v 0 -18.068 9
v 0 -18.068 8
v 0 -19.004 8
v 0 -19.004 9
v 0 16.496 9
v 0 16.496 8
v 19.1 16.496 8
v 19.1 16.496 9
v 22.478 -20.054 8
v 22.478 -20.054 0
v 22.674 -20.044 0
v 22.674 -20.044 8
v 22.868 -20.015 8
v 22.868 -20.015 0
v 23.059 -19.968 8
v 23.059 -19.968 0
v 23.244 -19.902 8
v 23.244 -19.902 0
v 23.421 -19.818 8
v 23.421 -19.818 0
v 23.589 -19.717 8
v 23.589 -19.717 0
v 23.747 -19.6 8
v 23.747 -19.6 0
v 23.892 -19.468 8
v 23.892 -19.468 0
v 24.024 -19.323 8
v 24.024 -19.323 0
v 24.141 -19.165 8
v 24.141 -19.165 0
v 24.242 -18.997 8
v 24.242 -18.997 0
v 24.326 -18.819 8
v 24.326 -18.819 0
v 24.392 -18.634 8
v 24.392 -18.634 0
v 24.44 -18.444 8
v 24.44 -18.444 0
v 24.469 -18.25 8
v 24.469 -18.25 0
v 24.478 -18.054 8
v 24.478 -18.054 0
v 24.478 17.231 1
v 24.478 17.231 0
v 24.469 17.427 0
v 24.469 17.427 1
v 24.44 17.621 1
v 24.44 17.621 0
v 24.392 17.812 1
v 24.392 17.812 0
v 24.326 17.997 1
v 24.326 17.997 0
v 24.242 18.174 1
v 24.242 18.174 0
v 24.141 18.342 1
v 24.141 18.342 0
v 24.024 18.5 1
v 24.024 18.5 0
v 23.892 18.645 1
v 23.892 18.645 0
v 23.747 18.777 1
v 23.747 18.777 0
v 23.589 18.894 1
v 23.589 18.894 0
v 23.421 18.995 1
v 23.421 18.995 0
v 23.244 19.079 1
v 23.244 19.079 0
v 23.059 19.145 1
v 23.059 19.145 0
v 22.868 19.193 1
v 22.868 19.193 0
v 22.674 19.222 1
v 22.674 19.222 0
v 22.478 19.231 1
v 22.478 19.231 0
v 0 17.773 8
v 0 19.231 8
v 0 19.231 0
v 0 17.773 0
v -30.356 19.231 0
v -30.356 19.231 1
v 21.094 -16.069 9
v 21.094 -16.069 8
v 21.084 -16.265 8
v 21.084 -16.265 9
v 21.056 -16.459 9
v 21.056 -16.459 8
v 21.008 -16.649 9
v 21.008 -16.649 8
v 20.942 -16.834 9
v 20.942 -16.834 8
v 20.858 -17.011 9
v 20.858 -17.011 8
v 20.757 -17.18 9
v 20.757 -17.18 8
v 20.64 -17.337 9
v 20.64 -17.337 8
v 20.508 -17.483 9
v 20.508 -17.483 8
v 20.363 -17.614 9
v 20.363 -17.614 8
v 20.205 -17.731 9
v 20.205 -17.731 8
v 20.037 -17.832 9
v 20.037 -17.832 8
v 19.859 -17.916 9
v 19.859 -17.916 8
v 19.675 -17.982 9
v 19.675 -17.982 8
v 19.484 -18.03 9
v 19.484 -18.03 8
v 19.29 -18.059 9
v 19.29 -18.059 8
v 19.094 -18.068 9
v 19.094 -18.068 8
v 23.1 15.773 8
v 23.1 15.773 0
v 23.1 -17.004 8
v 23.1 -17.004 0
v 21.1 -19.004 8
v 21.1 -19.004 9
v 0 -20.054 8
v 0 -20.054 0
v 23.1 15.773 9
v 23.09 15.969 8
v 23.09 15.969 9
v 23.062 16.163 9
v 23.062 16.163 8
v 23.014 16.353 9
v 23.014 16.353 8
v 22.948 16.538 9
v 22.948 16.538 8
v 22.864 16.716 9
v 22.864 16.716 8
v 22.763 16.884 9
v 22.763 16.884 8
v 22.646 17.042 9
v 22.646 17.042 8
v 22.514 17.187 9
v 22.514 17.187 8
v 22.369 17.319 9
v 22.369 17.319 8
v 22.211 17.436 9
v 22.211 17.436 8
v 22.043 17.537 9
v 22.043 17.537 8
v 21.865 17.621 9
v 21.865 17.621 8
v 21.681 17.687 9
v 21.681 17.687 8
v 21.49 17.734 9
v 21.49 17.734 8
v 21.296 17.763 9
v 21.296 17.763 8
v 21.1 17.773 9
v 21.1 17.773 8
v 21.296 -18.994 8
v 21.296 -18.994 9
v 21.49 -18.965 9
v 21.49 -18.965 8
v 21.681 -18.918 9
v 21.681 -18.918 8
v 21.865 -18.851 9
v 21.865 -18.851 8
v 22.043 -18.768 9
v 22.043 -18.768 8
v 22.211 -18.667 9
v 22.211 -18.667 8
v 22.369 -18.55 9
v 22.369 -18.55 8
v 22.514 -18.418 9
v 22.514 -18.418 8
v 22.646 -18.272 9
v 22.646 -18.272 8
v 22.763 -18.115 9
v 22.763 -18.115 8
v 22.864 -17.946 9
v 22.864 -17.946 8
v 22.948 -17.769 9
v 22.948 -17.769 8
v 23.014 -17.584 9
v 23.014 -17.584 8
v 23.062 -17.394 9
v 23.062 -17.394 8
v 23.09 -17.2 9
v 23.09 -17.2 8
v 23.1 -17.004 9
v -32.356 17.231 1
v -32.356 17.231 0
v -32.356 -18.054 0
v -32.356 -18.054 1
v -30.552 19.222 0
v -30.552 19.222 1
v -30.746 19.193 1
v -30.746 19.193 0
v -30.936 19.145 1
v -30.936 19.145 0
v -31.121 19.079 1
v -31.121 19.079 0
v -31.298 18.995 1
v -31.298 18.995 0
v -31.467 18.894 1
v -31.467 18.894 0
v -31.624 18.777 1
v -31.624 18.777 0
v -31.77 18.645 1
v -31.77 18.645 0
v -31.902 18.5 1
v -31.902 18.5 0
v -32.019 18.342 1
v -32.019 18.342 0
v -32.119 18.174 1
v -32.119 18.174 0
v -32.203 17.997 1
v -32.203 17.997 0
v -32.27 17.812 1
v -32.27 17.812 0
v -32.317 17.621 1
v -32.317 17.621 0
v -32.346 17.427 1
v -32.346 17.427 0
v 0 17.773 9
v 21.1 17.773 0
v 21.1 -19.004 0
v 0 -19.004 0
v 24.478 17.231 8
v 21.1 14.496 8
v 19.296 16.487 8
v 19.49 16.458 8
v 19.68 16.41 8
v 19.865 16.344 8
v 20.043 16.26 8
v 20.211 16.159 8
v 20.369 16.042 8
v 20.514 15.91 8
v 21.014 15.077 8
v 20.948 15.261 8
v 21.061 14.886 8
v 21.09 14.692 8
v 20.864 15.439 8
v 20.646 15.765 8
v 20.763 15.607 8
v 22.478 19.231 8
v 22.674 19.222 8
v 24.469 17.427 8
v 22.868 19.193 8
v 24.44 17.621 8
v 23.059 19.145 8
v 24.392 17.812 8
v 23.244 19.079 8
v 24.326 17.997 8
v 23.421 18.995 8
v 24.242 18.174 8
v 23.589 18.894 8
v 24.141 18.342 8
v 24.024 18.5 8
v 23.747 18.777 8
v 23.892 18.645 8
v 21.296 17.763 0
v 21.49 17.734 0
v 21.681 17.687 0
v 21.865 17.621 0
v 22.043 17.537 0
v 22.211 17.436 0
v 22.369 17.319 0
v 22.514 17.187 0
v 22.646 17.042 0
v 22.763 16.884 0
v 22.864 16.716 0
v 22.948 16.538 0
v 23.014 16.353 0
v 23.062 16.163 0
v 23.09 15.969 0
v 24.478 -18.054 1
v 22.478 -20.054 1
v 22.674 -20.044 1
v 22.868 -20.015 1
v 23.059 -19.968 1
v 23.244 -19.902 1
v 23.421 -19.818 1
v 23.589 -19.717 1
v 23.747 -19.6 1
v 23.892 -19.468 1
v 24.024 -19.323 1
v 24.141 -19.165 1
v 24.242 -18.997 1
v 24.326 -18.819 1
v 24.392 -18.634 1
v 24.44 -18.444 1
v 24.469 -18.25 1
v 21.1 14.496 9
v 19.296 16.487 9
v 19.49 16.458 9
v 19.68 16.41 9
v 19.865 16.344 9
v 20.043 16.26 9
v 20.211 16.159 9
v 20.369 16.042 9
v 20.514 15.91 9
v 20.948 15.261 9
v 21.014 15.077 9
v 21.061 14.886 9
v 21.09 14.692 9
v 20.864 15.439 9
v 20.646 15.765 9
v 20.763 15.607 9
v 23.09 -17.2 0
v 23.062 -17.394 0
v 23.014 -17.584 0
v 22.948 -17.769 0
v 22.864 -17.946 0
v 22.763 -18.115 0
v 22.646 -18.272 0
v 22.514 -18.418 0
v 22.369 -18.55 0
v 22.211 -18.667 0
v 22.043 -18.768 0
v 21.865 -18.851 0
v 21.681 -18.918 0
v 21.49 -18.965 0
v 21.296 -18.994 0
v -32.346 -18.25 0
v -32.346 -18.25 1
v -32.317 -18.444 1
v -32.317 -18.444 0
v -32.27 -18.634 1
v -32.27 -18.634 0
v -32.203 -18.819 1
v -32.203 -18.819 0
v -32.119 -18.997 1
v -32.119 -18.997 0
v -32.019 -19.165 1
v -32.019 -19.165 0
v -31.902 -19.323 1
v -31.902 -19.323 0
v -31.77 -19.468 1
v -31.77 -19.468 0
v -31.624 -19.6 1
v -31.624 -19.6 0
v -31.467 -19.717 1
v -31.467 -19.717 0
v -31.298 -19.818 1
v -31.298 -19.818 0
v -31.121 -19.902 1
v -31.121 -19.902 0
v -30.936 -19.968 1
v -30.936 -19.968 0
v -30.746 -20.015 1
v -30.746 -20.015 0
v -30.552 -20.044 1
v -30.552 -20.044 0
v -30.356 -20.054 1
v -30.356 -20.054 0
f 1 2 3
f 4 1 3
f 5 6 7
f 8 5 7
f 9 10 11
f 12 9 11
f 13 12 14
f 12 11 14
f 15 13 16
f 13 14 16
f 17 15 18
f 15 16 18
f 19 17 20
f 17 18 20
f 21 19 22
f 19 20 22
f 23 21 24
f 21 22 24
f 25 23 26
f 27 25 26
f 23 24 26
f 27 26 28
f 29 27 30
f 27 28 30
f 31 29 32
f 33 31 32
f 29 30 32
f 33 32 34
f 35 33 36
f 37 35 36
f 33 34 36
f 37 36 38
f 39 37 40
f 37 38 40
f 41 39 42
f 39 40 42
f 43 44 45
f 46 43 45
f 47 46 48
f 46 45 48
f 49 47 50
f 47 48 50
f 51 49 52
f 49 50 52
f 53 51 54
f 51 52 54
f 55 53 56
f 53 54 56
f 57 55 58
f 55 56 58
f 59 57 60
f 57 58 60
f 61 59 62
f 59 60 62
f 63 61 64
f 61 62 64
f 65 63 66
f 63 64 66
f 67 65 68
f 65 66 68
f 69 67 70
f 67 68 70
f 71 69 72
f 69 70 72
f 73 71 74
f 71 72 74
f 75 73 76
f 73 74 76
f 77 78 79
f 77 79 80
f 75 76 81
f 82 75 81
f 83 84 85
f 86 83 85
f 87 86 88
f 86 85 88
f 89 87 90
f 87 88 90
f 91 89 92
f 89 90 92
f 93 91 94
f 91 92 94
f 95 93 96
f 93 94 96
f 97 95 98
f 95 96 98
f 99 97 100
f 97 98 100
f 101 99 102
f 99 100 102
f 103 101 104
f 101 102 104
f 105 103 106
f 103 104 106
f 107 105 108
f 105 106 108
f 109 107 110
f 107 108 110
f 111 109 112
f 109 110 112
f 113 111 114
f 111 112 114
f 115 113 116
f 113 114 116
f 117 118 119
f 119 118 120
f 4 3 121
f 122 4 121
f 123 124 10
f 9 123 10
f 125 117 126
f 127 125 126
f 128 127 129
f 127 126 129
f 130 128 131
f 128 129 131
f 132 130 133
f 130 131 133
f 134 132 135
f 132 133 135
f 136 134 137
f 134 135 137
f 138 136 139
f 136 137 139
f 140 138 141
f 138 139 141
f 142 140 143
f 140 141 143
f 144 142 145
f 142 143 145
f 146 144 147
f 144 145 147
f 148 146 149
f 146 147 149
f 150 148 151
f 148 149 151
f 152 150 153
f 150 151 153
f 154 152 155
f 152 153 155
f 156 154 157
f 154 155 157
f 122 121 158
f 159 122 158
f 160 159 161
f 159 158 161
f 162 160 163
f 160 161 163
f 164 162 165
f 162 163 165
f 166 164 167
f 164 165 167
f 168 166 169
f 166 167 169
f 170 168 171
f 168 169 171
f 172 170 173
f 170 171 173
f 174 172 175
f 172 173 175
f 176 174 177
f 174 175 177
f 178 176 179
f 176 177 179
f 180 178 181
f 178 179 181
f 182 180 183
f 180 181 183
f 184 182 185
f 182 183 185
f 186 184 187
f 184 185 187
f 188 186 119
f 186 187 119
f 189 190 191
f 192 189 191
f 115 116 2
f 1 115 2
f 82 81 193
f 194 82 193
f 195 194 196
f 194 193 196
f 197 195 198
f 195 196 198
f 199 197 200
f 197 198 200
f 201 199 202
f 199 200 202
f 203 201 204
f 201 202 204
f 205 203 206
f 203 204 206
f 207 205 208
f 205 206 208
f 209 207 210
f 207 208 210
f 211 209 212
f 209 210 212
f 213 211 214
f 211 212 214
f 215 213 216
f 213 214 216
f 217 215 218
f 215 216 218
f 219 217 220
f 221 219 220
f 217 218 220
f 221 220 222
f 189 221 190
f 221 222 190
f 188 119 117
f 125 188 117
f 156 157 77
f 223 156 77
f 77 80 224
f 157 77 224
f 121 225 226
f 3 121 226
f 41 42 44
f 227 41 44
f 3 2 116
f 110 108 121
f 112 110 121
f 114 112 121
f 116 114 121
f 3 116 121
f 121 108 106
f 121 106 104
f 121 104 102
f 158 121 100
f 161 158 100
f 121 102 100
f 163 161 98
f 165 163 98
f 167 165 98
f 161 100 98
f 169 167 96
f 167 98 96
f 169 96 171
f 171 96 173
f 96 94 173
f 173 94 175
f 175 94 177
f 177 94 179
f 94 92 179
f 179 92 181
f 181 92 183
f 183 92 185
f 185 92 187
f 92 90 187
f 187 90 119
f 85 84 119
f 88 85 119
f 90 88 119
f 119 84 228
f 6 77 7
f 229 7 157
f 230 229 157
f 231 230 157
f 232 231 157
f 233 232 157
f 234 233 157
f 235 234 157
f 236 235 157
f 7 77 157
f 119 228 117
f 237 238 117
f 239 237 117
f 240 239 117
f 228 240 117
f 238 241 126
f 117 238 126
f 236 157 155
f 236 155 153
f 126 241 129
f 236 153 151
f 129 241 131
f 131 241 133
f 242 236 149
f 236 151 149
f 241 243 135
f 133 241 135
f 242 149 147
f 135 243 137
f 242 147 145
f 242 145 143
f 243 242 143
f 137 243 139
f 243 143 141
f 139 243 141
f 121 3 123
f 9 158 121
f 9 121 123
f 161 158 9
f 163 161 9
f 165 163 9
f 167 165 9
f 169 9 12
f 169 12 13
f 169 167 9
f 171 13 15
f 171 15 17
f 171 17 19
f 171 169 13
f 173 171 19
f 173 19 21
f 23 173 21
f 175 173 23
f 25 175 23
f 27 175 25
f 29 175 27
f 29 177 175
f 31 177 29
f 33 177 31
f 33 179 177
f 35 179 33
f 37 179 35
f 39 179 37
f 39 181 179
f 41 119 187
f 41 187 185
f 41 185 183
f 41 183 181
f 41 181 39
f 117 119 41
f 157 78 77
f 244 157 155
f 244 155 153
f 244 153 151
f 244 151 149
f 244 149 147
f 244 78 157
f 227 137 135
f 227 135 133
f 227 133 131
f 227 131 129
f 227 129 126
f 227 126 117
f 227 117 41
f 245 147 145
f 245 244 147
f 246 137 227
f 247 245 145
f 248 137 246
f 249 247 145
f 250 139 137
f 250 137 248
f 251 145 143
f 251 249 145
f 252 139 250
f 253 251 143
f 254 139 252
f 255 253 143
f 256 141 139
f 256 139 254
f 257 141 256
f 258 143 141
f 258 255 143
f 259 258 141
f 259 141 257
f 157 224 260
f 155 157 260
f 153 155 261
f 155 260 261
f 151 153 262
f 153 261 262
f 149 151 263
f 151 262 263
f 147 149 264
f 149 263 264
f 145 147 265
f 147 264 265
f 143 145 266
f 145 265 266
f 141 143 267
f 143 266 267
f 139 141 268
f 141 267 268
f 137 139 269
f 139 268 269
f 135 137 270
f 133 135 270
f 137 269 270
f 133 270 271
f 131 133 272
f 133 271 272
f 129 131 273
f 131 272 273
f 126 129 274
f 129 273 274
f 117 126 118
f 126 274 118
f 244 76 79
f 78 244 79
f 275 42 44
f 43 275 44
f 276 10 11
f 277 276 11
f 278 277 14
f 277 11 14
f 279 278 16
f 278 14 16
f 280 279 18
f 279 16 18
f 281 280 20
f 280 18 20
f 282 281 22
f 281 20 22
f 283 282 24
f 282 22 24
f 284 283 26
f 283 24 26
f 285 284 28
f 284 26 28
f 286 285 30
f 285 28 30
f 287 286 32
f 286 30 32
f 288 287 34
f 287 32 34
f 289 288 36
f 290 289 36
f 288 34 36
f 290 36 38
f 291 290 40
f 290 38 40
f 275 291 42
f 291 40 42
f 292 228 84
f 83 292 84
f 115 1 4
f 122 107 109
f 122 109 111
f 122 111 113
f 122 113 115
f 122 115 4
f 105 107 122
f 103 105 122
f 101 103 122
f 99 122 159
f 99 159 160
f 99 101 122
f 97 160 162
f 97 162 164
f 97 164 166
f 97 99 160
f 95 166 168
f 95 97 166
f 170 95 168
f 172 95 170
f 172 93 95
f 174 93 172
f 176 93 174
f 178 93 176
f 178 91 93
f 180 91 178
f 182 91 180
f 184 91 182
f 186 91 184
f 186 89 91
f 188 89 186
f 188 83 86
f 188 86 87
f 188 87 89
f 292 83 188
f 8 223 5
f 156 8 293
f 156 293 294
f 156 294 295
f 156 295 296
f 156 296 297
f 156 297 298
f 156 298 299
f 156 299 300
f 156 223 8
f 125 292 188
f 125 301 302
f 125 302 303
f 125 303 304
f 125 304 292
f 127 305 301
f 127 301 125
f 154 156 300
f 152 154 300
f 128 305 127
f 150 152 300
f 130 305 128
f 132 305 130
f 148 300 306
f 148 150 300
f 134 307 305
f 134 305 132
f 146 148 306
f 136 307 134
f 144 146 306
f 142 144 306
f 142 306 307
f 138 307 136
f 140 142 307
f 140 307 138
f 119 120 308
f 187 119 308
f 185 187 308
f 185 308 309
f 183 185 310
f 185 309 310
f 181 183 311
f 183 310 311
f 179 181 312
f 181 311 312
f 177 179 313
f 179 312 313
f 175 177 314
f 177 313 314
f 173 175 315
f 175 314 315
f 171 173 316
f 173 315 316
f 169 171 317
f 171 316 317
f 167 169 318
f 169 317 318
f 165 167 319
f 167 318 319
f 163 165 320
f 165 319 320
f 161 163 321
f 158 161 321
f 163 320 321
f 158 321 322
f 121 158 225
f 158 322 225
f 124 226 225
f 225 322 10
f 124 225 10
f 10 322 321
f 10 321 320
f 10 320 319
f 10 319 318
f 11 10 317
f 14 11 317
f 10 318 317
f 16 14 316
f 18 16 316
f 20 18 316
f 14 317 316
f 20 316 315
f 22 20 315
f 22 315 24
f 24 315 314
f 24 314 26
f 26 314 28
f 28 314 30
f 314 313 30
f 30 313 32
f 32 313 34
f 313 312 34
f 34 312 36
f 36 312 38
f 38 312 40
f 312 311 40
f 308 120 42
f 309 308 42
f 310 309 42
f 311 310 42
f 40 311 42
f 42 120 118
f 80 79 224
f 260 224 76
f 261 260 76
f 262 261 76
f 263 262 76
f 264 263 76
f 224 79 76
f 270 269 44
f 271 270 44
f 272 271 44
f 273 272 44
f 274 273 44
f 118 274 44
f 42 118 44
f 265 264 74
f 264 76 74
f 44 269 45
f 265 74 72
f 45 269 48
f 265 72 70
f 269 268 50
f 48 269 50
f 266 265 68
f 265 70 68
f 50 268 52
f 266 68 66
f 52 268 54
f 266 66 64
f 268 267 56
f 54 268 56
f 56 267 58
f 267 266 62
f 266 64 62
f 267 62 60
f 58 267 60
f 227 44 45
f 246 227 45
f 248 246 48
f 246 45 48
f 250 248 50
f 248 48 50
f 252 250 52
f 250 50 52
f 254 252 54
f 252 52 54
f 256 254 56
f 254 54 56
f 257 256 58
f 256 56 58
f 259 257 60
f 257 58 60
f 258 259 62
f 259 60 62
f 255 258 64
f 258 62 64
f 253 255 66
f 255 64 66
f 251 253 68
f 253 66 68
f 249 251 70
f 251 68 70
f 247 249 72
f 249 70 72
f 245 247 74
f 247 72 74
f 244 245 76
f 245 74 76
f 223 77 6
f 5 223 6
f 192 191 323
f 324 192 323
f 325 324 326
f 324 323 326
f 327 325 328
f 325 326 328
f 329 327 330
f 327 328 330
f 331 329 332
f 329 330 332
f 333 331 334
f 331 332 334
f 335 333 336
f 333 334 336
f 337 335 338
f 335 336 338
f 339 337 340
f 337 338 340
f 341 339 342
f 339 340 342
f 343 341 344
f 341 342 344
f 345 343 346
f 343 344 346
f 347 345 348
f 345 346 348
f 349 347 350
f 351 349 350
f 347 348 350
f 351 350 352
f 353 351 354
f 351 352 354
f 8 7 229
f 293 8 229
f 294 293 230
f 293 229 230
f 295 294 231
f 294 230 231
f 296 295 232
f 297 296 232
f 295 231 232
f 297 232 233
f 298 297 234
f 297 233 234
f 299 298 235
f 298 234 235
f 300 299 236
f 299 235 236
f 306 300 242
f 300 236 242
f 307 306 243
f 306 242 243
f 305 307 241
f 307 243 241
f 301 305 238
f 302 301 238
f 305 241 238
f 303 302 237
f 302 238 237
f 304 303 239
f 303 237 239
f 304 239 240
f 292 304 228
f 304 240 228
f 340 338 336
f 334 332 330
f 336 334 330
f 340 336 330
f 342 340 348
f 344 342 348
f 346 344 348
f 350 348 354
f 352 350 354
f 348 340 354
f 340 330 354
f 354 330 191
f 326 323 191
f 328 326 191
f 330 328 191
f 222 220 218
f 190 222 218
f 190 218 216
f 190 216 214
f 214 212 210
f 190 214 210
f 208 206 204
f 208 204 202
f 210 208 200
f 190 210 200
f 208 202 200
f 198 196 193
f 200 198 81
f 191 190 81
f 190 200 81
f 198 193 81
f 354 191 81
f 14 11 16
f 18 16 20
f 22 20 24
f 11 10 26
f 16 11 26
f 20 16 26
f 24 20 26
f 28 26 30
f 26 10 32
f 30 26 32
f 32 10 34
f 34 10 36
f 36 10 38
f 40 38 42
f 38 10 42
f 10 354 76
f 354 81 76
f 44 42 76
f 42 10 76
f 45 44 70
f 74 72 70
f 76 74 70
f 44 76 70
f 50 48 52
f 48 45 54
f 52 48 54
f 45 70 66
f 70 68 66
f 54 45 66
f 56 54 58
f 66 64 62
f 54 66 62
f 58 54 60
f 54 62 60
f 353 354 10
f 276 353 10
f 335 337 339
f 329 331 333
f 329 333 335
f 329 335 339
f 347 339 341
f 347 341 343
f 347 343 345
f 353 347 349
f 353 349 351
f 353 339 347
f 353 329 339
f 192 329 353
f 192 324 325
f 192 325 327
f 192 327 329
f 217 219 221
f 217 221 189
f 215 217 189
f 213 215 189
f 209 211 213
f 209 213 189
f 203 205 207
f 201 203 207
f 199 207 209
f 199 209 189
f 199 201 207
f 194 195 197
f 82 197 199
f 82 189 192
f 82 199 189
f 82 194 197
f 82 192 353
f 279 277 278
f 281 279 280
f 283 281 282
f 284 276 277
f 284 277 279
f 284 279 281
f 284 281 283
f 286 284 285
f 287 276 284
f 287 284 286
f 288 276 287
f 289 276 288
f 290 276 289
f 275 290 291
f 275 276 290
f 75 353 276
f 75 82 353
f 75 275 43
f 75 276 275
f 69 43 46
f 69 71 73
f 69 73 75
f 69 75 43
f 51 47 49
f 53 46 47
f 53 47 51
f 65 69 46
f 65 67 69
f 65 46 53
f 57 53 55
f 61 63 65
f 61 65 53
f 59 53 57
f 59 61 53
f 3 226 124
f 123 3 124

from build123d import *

# Parameters (mm, degrees)
F1_DEPTH = 1
F3_DEPTH = 8
F7_DEPTH = 1


with BuildPart() as f1:
    # F0 (on Top) → F1 (new body)
    with BuildSketch(Plane.XY):
        with BuildLine():
            Line((22.4782363355, 19.2312198371), (-30.3556400836, 19.2312198371))
            ThreePointArc((-30.3556400836, 19.2312198371), (-31.7698536459, 18.6454333994), (-32.3556400836, 17.2312198371))
            Line((-32.3556400836, 17.2312198371), (-32.3556400836, -18.0538347155))
            ThreePointArc((-32.3556400836, -18.0538347155), (-31.7698536459, -19.4680482779), (-30.3556400836, -20.0538347155))
            Line((-30.3556400836, -20.0538347155), (22.4782363355, -20.0538347155))
            ThreePointArc((22.4782363355, -20.0538347155), (23.8924498979, -19.4680482779), (24.4782363355, -18.0538347155))
            Line((24.4782363355, -18.0538347155), (24.4782363355, 17.2312198371))
            ThreePointArc((24.4782363355, 17.2312198371), (23.8924498979, 18.6454333994), (22.4782363355, 19.2312198371))
        make_face()
    extrude(amount=F1_DEPTH)


with BuildPart() as f3:
    # F2 (on face) → F3 (new body)
    with BuildSketch(Plane.XY):
        with BuildLine():
            Line((24.4782363355, -18.0538347155), (24.4782363355, 17.2312198371))
            ThreePointArc((24.4782363355, 17.2312198371), (23.8924498979, 18.6454333994), (22.4782363355, 19.2312198371))
            Line((22.4782363355, 19.2312198371), (0, 19.2312198371))
            Line((0, 19.2312198371), (0, 17.772866413))
            Line((0, 17.772866413), (21.1001163512, 17.772866413))
            ThreePointArc((21.1001163512, 17.772866413), (22.5143299136, 17.1870799754), (23.1001163512, 15.772866413))
            Line((23.1001163512, 15.772866413), (23.1001163512, -17.0036967397))
            ThreePointArc((23.1001163512, -17.0036967397), (22.5143299136, -18.417910302), (21.1001163512, -19.0036967397))
            Line((21.1001163512, -19.0036967397), (0, -19.0036967397))
            Line((0, -19.0036967397), (0, -20.0538347155))
            Line((0, -20.0538347155), (22.4782363355, -20.0538347155))
            ThreePointArc((22.4782363355, -20.0538347155), (23.8924498979, -19.4680482779), (24.4782363355, -18.0538347155))
        make_face()
    extrude(amount=F3_DEPTH)


with BuildPart() as f7:
    # F6 (on plane+point) → F7 (new body)
    with BuildSketch(Plane.XY.offset(8)):
        with BuildLine():
            Line((0, -19.0036967397), (21.1001163512, -19.0036967397))
            ThreePointArc((21.1001163512, -19.0036967397), (22.5143299136, -18.417910302), (23.1001163512, -17.0036967397))
            Line((23.1001163512, -17.0036967397), (23.1001163512, 15.772866413))
            ThreePointArc((23.1001163512, 15.772866413), (22.5143299136, 17.1870799754), (21.1001163512, 17.772866413))
            Line((21.1001163512, 17.772866413), (0, 17.772866413))
            Line((0, 17.772866413), (0, 16.4962187409))
            Line((0, 16.4962187409), (19.0997462398, 16.4962187409))
            ThreePointArc((19.0997462398, 16.4962187409), (20.5140906382, 15.9103014552), (21.0997462056, 14.4958486638))
            Line((21.0997462056, 14.4958486638), (21.0940905789, -16.0687321046))
            ThreePointArc((21.0940905789, -16.0687321046), (20.5081733274, -17.4827064258), (19.0940906131, -18.0683620274))
            Line((19.0940906131, -18.0683620274), (0, -18.0683620274))
            Line((0, -18.0683620274), (0, -19.0036967397))
        make_face()
    extrude(amount=F7_DEPTH)


solid = Compound([f1.part, f3.part, f7.part])
